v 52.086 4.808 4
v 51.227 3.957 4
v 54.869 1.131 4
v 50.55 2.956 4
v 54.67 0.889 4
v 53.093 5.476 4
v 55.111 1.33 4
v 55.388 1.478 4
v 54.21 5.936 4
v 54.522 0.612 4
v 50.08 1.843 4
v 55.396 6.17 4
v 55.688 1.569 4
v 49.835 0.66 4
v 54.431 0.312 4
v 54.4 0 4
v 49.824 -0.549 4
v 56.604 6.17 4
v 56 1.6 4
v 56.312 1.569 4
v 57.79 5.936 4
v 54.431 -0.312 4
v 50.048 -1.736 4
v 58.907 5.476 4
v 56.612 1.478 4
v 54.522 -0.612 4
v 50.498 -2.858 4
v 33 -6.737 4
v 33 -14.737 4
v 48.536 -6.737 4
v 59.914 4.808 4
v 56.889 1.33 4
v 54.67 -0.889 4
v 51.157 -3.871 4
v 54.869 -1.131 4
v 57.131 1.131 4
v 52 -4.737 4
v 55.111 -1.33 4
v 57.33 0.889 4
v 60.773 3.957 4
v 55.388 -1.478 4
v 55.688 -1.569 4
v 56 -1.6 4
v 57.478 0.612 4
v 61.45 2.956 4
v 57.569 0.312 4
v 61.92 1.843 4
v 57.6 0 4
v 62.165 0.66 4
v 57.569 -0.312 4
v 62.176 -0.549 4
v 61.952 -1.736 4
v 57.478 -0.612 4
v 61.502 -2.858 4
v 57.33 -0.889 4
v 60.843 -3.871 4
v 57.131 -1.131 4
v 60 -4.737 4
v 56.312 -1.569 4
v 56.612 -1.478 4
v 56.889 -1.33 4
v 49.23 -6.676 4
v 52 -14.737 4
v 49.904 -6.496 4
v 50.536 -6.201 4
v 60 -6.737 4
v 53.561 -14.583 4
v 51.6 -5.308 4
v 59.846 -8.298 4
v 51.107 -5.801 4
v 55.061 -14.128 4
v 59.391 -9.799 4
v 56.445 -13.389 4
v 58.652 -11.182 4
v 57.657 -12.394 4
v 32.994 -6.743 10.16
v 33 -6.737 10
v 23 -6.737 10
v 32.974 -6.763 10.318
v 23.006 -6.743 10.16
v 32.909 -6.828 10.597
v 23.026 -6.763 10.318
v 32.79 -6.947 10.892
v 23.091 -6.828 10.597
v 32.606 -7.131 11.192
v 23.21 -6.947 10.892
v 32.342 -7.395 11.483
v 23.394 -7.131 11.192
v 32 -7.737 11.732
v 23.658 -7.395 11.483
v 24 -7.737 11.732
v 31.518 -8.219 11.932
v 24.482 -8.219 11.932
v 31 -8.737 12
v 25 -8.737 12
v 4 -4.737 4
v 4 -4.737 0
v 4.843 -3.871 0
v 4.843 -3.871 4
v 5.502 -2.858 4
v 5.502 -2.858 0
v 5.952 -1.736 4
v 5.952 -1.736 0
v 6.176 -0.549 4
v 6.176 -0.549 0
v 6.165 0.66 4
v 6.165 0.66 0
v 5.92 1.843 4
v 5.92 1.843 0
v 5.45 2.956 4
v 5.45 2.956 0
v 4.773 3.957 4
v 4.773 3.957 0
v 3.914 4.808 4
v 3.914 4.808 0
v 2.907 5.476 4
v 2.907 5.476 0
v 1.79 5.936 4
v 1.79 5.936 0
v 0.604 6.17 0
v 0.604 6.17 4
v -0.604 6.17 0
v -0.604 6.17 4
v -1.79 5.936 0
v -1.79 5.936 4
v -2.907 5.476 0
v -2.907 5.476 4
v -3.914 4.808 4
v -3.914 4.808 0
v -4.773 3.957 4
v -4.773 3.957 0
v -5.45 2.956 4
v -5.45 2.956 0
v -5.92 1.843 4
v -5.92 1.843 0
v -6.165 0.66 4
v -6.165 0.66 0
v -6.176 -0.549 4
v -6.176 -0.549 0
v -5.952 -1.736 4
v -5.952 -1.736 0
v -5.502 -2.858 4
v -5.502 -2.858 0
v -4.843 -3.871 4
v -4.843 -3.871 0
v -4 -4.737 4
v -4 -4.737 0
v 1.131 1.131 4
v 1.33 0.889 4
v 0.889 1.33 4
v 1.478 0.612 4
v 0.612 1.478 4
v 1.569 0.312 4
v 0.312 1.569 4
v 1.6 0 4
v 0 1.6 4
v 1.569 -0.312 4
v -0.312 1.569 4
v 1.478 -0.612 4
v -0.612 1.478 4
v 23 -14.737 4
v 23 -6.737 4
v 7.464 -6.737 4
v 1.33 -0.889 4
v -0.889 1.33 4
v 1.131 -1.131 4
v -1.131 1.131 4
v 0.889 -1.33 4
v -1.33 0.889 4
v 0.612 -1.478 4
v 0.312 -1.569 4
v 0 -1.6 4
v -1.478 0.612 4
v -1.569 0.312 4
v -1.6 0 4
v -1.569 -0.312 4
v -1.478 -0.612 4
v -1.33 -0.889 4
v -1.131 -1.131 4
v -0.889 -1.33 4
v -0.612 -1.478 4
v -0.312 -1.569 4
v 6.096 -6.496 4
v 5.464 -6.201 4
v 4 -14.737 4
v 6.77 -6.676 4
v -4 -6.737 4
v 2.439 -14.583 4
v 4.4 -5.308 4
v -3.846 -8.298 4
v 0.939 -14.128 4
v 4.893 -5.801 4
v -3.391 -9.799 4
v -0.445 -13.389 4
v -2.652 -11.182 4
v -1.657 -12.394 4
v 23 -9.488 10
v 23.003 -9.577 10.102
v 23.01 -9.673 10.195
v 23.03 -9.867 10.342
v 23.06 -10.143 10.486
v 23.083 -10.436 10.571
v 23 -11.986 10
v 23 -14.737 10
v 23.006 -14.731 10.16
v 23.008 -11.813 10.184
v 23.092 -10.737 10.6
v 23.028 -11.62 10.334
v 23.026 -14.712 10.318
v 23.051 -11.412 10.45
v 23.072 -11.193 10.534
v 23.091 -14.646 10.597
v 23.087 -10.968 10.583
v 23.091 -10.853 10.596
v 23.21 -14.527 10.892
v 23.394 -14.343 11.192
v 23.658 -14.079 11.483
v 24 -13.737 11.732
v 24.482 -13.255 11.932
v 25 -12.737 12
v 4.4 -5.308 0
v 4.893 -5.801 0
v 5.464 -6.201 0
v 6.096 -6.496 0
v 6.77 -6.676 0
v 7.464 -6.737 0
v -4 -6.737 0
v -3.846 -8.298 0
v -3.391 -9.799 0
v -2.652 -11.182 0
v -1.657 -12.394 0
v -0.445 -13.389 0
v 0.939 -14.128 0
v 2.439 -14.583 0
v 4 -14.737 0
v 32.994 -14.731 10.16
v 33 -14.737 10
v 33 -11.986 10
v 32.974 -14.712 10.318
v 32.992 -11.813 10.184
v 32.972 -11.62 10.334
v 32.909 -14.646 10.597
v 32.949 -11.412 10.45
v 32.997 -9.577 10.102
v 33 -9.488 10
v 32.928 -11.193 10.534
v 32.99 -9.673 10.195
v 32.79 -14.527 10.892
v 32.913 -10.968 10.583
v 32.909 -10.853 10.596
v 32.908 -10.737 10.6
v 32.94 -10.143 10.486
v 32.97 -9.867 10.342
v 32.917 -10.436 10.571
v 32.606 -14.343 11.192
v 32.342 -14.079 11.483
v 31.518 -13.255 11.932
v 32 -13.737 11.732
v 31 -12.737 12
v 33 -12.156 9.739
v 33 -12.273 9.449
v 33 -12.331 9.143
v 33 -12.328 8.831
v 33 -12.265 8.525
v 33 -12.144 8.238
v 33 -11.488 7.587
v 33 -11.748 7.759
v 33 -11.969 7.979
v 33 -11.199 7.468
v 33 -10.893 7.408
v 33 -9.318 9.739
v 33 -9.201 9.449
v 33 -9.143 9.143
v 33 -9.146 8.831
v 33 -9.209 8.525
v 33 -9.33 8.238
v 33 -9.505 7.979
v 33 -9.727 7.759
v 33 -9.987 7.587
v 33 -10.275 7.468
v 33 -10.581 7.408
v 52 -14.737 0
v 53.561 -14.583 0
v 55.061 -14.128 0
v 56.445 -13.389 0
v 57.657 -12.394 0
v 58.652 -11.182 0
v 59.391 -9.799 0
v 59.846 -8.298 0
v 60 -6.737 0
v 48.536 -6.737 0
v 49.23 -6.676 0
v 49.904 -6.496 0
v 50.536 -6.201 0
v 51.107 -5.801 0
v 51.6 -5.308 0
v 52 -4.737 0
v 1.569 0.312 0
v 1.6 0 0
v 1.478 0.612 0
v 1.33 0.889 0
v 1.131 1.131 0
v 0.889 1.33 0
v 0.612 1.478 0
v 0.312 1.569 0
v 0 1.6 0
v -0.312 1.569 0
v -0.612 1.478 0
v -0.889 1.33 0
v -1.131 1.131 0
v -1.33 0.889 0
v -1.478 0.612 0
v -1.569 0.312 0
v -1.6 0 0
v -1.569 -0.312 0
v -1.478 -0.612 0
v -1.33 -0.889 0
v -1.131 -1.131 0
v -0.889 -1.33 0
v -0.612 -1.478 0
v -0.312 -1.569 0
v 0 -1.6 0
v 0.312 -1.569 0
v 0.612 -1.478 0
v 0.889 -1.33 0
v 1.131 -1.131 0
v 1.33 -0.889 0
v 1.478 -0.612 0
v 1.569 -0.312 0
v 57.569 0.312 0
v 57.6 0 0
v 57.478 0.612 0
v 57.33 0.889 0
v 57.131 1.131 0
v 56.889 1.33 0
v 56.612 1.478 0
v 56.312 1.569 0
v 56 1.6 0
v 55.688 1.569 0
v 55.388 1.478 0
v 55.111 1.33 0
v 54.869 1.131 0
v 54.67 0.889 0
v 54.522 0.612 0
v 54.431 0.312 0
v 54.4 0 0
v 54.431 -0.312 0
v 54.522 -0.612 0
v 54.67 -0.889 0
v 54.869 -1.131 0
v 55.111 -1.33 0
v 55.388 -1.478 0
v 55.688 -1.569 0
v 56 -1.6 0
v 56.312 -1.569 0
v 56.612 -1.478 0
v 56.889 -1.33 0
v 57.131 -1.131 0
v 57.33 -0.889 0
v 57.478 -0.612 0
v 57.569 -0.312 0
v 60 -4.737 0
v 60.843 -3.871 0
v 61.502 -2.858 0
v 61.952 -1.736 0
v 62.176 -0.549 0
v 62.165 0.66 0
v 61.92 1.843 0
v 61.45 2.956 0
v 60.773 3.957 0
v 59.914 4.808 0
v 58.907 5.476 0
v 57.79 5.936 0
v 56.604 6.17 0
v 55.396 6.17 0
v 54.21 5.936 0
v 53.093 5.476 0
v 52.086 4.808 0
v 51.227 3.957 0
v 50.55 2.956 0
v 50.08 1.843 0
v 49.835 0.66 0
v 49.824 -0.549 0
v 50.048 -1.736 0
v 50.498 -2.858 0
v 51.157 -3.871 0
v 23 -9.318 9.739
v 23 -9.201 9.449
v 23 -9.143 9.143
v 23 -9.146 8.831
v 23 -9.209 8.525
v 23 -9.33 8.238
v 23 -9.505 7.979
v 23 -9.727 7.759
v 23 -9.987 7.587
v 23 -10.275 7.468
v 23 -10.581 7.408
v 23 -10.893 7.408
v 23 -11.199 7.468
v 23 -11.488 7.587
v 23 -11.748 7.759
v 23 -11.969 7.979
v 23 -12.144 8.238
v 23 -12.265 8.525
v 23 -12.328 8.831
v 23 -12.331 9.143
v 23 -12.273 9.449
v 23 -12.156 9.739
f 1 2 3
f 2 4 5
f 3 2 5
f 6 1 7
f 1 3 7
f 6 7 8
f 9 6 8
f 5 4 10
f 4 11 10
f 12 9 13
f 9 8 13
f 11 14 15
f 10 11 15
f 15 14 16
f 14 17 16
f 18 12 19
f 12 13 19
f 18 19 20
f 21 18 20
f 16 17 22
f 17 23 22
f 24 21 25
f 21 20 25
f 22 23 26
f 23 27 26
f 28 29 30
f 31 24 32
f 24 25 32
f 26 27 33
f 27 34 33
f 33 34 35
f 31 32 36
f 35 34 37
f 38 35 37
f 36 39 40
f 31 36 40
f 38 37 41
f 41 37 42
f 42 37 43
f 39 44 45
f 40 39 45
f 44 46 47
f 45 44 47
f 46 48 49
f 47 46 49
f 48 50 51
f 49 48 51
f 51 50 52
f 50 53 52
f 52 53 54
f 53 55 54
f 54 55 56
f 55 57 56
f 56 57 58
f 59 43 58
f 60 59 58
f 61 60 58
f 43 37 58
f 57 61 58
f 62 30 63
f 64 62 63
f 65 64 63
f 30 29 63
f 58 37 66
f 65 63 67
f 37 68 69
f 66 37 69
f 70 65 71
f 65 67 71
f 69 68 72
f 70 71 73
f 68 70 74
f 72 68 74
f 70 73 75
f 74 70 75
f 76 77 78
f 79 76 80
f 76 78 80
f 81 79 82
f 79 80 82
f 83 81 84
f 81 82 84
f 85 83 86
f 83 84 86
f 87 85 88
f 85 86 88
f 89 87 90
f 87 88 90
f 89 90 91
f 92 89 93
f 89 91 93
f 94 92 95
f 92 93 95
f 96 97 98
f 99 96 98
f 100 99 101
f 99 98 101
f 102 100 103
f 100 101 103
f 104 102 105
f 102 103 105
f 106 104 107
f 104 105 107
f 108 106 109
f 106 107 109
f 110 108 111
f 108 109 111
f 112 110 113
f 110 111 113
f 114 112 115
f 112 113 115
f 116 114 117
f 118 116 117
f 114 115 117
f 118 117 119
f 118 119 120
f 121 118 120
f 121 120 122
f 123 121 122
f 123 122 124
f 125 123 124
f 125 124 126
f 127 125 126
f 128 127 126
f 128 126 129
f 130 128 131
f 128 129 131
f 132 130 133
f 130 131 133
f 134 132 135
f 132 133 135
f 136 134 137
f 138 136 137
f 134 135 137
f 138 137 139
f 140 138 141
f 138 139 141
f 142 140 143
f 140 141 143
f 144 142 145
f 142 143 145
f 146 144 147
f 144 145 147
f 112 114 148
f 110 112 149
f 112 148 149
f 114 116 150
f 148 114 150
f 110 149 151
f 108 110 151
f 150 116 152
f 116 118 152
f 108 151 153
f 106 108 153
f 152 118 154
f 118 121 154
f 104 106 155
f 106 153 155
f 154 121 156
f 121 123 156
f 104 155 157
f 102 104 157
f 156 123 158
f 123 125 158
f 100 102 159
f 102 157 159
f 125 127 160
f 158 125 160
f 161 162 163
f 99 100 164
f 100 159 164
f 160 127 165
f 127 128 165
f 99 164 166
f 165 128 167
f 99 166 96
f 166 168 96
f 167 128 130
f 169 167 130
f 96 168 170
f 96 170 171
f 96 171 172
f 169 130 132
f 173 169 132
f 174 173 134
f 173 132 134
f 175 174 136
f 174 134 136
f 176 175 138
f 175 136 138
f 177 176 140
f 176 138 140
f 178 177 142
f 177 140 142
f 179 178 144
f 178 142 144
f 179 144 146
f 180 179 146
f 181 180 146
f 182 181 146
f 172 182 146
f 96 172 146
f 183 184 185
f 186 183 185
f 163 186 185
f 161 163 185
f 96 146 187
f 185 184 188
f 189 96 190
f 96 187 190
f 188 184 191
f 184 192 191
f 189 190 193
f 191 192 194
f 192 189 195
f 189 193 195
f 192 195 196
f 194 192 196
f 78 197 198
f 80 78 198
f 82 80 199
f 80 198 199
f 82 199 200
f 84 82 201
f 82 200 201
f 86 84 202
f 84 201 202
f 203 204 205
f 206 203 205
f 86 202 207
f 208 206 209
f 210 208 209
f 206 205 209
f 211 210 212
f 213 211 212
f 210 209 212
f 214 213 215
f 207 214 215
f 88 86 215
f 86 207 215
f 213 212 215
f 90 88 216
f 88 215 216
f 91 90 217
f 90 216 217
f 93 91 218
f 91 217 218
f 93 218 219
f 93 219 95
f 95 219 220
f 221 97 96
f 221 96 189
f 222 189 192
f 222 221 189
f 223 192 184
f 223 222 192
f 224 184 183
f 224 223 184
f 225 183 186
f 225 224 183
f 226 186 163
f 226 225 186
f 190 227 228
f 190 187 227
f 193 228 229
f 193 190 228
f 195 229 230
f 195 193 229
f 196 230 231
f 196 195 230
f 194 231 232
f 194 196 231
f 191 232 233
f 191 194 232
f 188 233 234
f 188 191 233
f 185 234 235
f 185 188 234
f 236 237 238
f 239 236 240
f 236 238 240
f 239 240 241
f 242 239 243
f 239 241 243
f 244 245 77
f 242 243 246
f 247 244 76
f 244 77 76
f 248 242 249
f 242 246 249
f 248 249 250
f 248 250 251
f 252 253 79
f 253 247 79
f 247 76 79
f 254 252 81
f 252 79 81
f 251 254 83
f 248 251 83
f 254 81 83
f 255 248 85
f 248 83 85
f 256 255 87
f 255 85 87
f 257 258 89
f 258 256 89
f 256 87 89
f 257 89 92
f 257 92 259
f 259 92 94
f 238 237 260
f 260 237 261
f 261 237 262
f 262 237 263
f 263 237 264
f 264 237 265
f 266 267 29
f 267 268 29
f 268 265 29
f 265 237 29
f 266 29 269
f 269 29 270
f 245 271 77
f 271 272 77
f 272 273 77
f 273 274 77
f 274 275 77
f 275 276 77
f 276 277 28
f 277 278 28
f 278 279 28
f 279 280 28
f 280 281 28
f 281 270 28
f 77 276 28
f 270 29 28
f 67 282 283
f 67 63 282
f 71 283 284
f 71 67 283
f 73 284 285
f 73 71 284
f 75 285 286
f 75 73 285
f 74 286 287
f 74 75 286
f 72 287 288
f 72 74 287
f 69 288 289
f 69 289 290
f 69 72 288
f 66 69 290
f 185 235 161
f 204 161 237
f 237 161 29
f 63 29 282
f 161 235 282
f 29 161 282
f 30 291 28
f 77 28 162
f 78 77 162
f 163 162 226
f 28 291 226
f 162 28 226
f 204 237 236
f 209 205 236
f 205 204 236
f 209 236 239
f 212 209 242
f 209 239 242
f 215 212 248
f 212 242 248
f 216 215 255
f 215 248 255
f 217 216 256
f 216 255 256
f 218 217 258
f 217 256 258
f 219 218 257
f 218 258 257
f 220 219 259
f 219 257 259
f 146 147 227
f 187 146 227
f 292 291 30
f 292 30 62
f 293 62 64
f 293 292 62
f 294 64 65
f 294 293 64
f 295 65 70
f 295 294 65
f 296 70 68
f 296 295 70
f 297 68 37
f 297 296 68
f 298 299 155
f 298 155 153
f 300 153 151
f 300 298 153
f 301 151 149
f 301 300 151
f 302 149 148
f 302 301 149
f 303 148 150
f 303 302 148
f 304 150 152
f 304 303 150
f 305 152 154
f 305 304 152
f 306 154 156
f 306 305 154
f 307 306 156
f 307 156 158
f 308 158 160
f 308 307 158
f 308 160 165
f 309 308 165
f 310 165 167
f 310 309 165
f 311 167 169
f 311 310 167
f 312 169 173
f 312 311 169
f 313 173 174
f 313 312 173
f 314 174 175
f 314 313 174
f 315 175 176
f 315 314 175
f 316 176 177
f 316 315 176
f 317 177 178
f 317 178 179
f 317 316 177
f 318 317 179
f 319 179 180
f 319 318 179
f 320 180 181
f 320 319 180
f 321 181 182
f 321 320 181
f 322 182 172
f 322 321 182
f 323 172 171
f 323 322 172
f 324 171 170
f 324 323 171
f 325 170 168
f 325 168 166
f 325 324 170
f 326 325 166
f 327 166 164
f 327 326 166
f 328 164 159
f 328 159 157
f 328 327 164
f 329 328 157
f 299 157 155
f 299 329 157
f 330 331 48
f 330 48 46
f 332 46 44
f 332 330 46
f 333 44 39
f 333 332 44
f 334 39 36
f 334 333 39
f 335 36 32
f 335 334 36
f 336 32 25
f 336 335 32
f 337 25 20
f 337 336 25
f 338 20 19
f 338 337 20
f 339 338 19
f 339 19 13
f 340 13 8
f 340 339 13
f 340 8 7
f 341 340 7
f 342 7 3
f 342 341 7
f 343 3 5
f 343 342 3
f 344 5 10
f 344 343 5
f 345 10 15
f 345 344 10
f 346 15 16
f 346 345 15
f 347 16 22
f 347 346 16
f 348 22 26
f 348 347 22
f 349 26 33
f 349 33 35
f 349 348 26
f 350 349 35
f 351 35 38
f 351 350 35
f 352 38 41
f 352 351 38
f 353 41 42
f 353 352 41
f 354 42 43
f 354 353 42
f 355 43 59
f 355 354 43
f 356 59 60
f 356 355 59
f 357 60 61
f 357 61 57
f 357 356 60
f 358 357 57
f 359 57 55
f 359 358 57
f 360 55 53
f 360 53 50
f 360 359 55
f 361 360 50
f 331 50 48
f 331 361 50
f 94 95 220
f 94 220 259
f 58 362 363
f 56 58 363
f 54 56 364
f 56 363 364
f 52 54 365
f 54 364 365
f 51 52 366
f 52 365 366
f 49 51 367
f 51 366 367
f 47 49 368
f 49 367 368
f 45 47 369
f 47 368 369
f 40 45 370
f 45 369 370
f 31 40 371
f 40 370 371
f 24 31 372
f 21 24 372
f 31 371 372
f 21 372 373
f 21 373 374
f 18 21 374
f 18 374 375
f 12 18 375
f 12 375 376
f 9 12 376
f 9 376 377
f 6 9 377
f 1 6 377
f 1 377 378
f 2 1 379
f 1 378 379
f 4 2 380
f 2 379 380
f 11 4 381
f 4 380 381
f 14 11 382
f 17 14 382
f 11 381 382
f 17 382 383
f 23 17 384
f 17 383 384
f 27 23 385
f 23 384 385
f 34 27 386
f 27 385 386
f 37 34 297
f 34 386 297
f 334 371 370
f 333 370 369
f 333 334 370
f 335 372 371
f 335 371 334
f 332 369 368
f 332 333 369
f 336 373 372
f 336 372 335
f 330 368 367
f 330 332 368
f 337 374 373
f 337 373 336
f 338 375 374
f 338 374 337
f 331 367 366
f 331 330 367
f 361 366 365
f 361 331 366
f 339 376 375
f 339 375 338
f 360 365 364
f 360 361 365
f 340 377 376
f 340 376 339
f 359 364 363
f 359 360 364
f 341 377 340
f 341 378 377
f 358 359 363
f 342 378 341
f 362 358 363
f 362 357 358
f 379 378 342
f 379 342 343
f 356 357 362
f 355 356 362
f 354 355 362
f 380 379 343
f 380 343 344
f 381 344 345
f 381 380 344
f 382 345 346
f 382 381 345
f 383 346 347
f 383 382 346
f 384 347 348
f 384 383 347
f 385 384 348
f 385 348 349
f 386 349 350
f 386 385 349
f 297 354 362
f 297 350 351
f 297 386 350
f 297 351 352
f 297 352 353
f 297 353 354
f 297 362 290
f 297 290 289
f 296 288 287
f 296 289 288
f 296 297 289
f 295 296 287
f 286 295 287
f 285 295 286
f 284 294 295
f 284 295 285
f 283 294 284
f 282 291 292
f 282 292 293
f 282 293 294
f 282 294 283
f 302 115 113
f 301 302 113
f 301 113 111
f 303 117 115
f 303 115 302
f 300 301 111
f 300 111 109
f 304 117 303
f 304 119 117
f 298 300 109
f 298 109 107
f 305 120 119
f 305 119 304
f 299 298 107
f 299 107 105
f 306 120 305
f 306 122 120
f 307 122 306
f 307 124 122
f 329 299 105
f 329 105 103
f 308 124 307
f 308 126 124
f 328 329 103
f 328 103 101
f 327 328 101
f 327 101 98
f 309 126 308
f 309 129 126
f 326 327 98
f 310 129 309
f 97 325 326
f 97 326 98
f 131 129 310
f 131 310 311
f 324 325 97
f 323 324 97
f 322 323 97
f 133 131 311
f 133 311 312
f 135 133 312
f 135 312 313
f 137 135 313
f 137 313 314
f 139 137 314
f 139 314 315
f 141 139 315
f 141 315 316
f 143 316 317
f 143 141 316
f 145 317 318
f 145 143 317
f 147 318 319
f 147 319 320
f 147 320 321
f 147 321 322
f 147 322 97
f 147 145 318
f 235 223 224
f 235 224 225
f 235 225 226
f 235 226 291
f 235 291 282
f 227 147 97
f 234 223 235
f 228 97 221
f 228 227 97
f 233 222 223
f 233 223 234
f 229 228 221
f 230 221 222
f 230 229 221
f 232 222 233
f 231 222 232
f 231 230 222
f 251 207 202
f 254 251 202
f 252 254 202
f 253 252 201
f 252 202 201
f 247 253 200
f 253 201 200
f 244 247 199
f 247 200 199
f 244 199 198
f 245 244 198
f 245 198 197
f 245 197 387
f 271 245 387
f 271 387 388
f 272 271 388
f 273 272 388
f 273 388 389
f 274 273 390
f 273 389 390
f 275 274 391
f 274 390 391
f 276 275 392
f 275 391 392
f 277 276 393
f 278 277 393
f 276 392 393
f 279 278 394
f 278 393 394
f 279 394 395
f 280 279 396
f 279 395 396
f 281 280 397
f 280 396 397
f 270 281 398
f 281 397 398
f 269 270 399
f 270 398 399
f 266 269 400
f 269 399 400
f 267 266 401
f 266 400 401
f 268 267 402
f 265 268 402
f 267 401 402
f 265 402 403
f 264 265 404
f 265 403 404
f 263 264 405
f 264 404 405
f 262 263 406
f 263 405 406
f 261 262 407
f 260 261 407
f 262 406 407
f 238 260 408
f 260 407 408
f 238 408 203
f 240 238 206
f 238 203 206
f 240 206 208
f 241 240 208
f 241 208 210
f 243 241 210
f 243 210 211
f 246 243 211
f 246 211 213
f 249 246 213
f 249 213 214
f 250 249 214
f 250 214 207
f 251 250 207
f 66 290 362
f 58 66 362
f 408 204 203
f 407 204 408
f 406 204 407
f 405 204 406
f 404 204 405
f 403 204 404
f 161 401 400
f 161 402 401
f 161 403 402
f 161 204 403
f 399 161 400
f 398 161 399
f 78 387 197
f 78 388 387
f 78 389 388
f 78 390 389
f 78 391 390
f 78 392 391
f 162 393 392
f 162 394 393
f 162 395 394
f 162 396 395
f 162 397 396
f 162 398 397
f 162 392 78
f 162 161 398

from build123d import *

# Parameters (mm, degrees)
CROQUIS1_R              = 1.6
SALIENTE_EXTRUIR1_DEPTH = 4
CROQUIS2_W              = 10
CROQUIS2_H              = 8
SALIENTE_EXTRUIR2_DEPTH = 8
CORTAR_EXTRUIR1_REACH   = 45.564
CROQUIS3_R              = 1.6
REDONDEO1_R             = 2
REDONDEO2_R             = 8
REDONDEO3_R             = 4


with BuildPart() as part:
    # Croquis1 → Saliente-Extruir1 (new body)
    with BuildSketch(Plane.XY):
        with BuildLine():
            Line((-4, -4.737087713), (-4, -14.737087713))
            Line((-4, -14.737087713), (60, -14.737087713))
            Line((60, -14.737087713), (60, -4.737087713))
            ThreePointArc((60, -4.737087713), (56, 6.2), (52, -4.737087713))
            Line((52, -4.737087713), (52, -6.737087713))
            Line((52, -6.737087713), (4, -6.737087713))
            Line((4, -6.737087713), (4, -4.737087713))
            ThreePointArc((4, -4.737087713), (0, 6.2), (-4, -4.737087713))
        make_face()
        Circle(CROQUIS1_R, mode=Mode.SUBTRACT)
        with Locations((56, 0)):
            Circle(CROQUIS1_R, mode=Mode.SUBTRACT)
    extrude(amount=SALIENTE_EXTRUIR1_DEPTH)

    # Croquis2 → Saliente-Extruir2 (add)
    with BuildSketch(Plane.XY.offset(4)):
        with Locations((28, -10.737087713)):
            Rectangle(CROQUIS2_W, CROQUIS2_H)
    extrude(amount=SALIENTE_EXTRUIR2_DEPTH)

    # Croquis3 → Cortar-Extruir1 (cut, up to next)
    with BuildSketch(Plane.ZY.offset(-23), mode=Mode.PRIVATE) as cortar_extruir1_sk1:
        with Locations((9, -10.737087713)):
            Circle(CROQUIS3_R)
    cortar_extruir1_tool1 = extrude(cortar_extruir1_sk1.sketch, amount=-CORTAR_EXTRUIR1_REACH, mode=Mode.PRIVATE) & part.part
    add(cortar_extruir1_tool1.solids().sort_by_distance((23, -10.737088, 9))[0], mode=Mode.SUBTRACT)

    # Redondeo1
    # the kernel refuses this fillet: 2 mm, written as the material it takes off along each edge
    with BuildSketch(Plane(origin=(33, -1.737087713, 12), x_dir=(-1, 0, 0), z_dir=(0, -1, 0))) as redondeo1_piece_1:
        with BuildLine():
            CenterArc((REDONDEO1_R, REDONDEO1_R), REDONDEO1_R, 180, 90)
            Line((0, REDONDEO1_R), (0, 0))
            Line((0, 0), (REDONDEO1_R, 0))
        make_face()
    extrude(amount=18, mode=Mode.SUBTRACT)
    with BuildSketch(Plane(origin=(23, -19.737087713, 12), x_dir=(0, 0, -1), z_dir=(0, 1, 0))) as redondeo1_piece_2:
        with BuildLine():
            CenterArc((REDONDEO1_R, -REDONDEO1_R), REDONDEO1_R, 90, 90)
            Line((0, -REDONDEO1_R), (0, 0))
            Line((0, 0), (REDONDEO1_R, 0))
        make_face()
    extrude(amount=18, mode=Mode.SUBTRACT)
    with BuildSketch(Plane(origin=(18, -6.737087713, 12), x_dir=(0, -1, 0), z_dir=(1, 0, 0))) as redondeo1_piece_3:
        with BuildLine():
            CenterArc((REDONDEO1_R, REDONDEO1_R), REDONDEO1_R, 180, 90)
            Line((0, REDONDEO1_R), (0, 0))
            Line((0, 0), (REDONDEO1_R, 0))
        make_face()
    extrude(amount=20, mode=Mode.SUBTRACT)
    with BuildSketch(Plane(origin=(38, -14.737087713, 12), x_dir=(0, 0, -1), z_dir=(-1, 0, 0))) as redondeo1_piece_4:
        with BuildLine():
            CenterArc((REDONDEO1_R, -REDONDEO1_R), REDONDEO1_R, 90, 90)
            Line((0, -REDONDEO1_R), (0, 0))
            Line((0, 0), (REDONDEO1_R, 0))
        make_face()
    extrude(amount=20, mode=Mode.SUBTRACT)

    # Redondeo2
    redondeo2_edges = [part.edges().sort_by_distance(p)[0] for p in [
        (60, -14.737087713, 2),
        (-4, -14.737087713, 2),
    ]]
    fillet(redondeo2_edges, radius=REDONDEO2_R)

    # Redondeo3
    # the kernel refuses this fillet: 4 mm, written as the material it adds along each edge
    with BuildSketch(Plane(origin=(52, -6.737087713, 0), x_dir=(-1, 0, 0), z_dir=(0, 0, 1))) as redondeo3_piece_1:
        with BuildLine():
            CenterArc((3.464101615, -4), REDONDEO3_R, 90, 60)
            Line((0, -2), (-0.069282032, -1.96))
            ThreePointArc((-0.069282032, -1.96), (-0.08, -1), (-0.08, 0))
            Line((-0.08, 0), (0, 0.08))
            Line((0, 0.08), (3.464101615, 0.08))
            Line((3.464101615, 0.08), (3.464101615, 0))
        make_face()
    extrude(amount=4)
    with BuildSketch(Plane(origin=(4, -6.737087713, 0), x_dir=(0, 1, 0), z_dir=(0, 0, 1))) as redondeo3_piece_2:
        with BuildLine():
            CenterArc((4, -3.464101615), REDONDEO3_R, 120, 60)
            Line((0, -3.464101615), (-0.08, -3.464101615))
            Line((-0.08, -3.464101615), (-0.08, 0))
            Line((-0.08, 0), (0, 0.08))
            ThreePointArc((0, 0.08), (1, 0.08), (1.96, 0.069282032))
            Line((1.96, 0.069282032), (2, 0))
        make_face()
    extrude(amount=4)


solid = part.part
